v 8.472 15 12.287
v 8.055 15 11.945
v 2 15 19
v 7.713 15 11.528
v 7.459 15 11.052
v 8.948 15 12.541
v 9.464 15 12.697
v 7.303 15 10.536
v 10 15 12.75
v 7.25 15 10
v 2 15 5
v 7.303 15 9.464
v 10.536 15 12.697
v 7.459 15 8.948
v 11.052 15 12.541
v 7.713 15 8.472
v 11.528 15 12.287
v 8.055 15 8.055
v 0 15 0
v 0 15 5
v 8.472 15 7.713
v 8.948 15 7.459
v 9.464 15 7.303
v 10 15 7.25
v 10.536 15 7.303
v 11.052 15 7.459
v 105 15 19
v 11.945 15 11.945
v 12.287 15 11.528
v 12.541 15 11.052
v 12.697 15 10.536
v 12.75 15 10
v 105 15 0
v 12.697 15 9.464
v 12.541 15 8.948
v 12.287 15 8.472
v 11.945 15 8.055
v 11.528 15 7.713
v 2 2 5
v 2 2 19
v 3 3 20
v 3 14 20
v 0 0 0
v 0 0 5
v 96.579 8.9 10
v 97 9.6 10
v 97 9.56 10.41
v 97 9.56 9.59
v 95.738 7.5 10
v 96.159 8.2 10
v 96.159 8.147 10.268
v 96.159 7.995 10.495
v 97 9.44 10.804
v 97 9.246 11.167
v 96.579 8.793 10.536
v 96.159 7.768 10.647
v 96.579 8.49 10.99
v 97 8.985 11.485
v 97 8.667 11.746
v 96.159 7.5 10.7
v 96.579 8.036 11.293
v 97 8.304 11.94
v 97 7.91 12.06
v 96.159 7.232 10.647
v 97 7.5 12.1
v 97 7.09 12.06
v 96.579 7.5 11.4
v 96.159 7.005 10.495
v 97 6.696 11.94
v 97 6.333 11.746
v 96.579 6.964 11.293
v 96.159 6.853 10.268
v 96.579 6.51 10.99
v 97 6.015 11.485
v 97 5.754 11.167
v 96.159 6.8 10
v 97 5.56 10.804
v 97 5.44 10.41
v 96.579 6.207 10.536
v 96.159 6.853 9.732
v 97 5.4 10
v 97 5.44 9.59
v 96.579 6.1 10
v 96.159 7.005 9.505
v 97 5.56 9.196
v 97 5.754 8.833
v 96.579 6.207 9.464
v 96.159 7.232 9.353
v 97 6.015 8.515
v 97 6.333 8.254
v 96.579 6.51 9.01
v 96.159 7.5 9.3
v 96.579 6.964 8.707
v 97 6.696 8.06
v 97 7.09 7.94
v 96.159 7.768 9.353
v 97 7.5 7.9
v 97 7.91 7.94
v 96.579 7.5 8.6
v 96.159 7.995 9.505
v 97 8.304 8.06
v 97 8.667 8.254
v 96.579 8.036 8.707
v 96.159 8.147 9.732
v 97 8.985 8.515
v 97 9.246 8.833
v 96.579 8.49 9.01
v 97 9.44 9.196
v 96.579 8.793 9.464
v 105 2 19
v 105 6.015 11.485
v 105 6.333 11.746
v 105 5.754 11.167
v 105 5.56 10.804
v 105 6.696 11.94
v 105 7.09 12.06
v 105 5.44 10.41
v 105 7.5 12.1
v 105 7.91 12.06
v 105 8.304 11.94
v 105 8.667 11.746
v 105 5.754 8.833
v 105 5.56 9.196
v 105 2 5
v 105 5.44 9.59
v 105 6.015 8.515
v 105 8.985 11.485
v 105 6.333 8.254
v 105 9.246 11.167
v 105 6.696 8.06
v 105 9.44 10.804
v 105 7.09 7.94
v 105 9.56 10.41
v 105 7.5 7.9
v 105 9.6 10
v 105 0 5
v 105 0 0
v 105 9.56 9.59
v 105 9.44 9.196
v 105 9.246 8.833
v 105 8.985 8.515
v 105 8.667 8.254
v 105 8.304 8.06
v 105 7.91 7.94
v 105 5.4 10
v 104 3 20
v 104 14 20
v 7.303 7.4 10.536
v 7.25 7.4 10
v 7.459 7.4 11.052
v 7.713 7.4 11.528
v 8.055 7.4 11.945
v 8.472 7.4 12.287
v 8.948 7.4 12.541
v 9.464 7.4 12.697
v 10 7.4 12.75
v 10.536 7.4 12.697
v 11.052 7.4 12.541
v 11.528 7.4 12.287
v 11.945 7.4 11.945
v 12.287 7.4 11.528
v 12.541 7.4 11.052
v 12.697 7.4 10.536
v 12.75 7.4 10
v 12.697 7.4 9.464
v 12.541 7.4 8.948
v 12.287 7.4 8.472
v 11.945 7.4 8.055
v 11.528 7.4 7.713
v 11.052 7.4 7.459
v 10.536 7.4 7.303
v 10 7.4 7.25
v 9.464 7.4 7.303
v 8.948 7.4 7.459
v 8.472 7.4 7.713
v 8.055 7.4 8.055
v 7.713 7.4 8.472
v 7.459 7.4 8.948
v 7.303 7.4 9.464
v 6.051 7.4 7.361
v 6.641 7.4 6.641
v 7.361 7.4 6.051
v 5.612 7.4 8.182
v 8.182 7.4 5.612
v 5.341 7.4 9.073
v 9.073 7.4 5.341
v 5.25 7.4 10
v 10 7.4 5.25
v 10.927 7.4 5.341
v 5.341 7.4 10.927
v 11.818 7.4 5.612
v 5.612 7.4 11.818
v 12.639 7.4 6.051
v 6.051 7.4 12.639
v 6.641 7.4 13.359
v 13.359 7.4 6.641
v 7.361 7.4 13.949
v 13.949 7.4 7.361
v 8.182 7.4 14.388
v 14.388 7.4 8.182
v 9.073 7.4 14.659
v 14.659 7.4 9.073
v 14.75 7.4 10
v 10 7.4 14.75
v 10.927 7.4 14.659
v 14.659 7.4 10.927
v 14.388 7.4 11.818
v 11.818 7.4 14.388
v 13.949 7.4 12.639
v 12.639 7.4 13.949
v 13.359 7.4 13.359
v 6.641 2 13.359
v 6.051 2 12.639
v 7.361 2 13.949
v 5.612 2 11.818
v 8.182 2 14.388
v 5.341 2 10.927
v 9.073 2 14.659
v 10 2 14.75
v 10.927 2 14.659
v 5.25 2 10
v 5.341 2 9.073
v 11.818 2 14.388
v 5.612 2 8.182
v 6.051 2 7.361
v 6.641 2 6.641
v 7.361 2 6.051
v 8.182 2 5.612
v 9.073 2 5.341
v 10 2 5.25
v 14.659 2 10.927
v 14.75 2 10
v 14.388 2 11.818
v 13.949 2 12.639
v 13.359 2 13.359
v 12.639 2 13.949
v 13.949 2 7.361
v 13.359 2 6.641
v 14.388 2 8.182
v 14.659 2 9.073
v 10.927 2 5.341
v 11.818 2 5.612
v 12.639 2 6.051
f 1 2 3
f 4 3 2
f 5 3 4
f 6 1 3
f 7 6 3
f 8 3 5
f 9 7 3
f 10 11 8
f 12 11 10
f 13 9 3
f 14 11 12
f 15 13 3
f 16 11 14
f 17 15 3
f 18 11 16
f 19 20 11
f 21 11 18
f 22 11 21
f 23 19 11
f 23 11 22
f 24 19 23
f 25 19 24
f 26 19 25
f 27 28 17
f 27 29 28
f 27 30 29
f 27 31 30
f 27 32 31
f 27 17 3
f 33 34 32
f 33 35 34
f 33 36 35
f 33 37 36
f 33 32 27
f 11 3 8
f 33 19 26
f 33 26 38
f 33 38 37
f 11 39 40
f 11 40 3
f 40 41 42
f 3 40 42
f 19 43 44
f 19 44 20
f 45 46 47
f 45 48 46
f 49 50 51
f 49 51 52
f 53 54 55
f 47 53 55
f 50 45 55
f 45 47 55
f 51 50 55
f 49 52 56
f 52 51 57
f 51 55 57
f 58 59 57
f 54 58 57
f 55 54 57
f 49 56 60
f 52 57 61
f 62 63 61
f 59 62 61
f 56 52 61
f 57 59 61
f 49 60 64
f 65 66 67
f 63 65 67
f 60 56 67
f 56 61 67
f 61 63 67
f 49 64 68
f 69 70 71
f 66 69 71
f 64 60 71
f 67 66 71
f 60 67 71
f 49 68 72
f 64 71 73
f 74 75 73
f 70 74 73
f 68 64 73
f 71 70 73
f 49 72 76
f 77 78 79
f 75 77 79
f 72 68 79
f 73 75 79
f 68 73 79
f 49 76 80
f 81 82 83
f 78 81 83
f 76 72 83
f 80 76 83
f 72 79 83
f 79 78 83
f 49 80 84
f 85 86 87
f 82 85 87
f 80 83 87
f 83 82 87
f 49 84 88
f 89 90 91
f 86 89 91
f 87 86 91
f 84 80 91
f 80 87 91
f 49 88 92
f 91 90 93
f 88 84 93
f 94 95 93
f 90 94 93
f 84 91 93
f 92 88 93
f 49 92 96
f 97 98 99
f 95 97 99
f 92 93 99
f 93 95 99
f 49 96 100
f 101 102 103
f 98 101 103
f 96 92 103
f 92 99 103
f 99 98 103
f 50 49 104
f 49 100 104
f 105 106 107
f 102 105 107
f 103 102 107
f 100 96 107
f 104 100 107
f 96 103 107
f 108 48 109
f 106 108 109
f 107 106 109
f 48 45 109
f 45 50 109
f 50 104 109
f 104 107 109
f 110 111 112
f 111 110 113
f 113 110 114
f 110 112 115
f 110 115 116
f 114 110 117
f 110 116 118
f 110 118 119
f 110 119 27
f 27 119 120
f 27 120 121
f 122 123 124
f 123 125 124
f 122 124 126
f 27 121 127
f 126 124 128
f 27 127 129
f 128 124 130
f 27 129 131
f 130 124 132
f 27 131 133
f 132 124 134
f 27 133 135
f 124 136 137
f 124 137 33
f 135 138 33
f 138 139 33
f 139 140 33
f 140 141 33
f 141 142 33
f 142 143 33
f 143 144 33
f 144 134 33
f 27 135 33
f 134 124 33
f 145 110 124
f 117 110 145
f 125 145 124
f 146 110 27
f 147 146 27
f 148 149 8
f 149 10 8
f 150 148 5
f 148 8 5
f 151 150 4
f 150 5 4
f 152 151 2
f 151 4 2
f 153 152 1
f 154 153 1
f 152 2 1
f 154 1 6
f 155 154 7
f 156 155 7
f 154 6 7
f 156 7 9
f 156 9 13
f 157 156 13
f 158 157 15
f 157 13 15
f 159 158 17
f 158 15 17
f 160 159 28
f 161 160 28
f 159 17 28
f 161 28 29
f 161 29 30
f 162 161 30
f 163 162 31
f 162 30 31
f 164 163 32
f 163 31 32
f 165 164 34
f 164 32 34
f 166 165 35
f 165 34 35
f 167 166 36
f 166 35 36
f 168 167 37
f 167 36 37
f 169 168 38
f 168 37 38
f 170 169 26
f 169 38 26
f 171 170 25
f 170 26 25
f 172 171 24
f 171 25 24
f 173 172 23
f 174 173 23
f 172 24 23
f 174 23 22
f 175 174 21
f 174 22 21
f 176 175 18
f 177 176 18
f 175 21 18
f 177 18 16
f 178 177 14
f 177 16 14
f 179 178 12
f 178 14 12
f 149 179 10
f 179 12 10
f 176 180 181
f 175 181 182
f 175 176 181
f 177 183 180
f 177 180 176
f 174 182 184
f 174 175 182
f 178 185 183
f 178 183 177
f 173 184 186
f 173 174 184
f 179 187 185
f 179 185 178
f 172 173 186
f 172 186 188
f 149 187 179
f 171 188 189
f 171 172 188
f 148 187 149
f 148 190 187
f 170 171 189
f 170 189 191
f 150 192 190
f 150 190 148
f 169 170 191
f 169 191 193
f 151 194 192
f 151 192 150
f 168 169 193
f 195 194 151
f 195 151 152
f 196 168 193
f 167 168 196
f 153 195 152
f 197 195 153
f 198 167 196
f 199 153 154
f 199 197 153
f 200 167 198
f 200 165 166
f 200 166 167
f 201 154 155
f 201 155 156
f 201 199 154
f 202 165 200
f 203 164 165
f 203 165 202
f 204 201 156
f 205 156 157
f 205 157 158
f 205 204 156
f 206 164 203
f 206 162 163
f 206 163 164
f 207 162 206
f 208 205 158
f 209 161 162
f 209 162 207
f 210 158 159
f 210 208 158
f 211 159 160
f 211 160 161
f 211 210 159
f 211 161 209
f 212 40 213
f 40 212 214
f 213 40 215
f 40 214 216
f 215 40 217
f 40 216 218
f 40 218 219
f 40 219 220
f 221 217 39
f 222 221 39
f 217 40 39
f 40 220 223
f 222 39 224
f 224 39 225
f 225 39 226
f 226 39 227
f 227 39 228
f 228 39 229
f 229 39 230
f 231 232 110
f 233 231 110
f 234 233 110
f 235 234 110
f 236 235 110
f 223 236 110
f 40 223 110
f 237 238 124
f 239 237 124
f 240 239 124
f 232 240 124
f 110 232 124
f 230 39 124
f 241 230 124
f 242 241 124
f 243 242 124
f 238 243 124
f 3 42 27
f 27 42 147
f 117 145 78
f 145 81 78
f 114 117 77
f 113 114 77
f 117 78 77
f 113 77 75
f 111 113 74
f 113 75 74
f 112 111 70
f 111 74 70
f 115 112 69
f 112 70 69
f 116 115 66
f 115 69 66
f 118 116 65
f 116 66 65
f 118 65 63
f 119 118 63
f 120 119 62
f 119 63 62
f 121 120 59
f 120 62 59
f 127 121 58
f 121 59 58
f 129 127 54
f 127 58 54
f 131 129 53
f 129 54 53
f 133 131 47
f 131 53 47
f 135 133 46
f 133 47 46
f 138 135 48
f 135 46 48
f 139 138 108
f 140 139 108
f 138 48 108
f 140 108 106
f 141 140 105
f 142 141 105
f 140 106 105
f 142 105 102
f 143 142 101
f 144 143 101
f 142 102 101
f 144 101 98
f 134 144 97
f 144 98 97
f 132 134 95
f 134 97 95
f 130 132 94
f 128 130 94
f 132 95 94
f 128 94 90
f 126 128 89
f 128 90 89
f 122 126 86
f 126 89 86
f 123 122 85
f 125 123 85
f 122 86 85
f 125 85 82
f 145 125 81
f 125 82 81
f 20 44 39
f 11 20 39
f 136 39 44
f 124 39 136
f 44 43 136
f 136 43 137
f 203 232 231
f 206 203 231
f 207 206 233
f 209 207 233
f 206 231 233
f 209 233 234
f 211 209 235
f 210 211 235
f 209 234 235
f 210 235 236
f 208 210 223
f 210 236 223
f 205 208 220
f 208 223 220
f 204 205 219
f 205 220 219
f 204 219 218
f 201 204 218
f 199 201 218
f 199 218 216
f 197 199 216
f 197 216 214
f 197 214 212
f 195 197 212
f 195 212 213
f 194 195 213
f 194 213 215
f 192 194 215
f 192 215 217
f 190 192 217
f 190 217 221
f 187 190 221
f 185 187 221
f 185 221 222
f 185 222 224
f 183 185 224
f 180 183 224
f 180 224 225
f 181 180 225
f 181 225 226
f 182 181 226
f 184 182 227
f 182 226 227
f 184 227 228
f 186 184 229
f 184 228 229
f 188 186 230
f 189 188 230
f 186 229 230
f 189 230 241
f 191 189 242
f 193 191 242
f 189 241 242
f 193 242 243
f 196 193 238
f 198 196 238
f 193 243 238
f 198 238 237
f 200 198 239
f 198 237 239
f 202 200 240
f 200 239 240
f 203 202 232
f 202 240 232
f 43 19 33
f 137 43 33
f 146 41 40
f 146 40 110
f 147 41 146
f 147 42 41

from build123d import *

# Parameters (mm, degrees)
F0_W           = 105
F0_H           = 15
F1_DEPTH       = 5
F2_W           = 103
F2_H           = 13
F3_DEPTH       = 15
F5_D           = 4.2
F5_DEPTH       = 8
F5_TIP         = 1.2618073
F7_D           = 5.5
F7_CBORE_D     = 9.5
F7_CBORE_DEPTH = 5.4
F8_SIZE        = 1


with BuildPart() as f1:
    # F0 (on Top) → F1 (new body)
    with BuildSketch(Plane.XY):
        with Locations((52.5, 7.5)):
            Rectangle(F0_W, F0_H)
    extrude(amount=F1_DEPTH)

    # F2 (on face) → F3 (join)
    with BuildSketch(Plane.XY.offset(5)):
        with Locations((53.5, 8.5)):
            Rectangle(F2_W, F2_H)
    extrude(amount=F3_DEPTH)

    # F5
    with Locations(Plane.YZ.offset(105)):
        with Locations((7.5, 10)):
            Hole(F5_D / 2, depth=F5_DEPTH)
            with Locations((0, 0, -(F5_DEPTH + F5_TIP / 2))):  # 118° drill point
                Cone(0, F5_D / 2, F5_TIP, mode=Mode.SUBTRACT)

    # F7 (through all)
    with Locations(Plane.XZ.offset(-2)):
        with Locations((10, 10)):
            CounterBoreHole(F7_D / 2, F7_CBORE_D / 2, F7_CBORE_DEPTH)

    # F8
    f8_edges = [f1.edges().sort_by_distance(p)[0] for p in [
        (53.5, 2, 20),
        (53.5, 15, 20),
        (105, 8.5, 20),
        (2, 8.5, 20),
    ]]
    chamfer(f8_edges, length=F8_SIZE)


solid = f1.part
